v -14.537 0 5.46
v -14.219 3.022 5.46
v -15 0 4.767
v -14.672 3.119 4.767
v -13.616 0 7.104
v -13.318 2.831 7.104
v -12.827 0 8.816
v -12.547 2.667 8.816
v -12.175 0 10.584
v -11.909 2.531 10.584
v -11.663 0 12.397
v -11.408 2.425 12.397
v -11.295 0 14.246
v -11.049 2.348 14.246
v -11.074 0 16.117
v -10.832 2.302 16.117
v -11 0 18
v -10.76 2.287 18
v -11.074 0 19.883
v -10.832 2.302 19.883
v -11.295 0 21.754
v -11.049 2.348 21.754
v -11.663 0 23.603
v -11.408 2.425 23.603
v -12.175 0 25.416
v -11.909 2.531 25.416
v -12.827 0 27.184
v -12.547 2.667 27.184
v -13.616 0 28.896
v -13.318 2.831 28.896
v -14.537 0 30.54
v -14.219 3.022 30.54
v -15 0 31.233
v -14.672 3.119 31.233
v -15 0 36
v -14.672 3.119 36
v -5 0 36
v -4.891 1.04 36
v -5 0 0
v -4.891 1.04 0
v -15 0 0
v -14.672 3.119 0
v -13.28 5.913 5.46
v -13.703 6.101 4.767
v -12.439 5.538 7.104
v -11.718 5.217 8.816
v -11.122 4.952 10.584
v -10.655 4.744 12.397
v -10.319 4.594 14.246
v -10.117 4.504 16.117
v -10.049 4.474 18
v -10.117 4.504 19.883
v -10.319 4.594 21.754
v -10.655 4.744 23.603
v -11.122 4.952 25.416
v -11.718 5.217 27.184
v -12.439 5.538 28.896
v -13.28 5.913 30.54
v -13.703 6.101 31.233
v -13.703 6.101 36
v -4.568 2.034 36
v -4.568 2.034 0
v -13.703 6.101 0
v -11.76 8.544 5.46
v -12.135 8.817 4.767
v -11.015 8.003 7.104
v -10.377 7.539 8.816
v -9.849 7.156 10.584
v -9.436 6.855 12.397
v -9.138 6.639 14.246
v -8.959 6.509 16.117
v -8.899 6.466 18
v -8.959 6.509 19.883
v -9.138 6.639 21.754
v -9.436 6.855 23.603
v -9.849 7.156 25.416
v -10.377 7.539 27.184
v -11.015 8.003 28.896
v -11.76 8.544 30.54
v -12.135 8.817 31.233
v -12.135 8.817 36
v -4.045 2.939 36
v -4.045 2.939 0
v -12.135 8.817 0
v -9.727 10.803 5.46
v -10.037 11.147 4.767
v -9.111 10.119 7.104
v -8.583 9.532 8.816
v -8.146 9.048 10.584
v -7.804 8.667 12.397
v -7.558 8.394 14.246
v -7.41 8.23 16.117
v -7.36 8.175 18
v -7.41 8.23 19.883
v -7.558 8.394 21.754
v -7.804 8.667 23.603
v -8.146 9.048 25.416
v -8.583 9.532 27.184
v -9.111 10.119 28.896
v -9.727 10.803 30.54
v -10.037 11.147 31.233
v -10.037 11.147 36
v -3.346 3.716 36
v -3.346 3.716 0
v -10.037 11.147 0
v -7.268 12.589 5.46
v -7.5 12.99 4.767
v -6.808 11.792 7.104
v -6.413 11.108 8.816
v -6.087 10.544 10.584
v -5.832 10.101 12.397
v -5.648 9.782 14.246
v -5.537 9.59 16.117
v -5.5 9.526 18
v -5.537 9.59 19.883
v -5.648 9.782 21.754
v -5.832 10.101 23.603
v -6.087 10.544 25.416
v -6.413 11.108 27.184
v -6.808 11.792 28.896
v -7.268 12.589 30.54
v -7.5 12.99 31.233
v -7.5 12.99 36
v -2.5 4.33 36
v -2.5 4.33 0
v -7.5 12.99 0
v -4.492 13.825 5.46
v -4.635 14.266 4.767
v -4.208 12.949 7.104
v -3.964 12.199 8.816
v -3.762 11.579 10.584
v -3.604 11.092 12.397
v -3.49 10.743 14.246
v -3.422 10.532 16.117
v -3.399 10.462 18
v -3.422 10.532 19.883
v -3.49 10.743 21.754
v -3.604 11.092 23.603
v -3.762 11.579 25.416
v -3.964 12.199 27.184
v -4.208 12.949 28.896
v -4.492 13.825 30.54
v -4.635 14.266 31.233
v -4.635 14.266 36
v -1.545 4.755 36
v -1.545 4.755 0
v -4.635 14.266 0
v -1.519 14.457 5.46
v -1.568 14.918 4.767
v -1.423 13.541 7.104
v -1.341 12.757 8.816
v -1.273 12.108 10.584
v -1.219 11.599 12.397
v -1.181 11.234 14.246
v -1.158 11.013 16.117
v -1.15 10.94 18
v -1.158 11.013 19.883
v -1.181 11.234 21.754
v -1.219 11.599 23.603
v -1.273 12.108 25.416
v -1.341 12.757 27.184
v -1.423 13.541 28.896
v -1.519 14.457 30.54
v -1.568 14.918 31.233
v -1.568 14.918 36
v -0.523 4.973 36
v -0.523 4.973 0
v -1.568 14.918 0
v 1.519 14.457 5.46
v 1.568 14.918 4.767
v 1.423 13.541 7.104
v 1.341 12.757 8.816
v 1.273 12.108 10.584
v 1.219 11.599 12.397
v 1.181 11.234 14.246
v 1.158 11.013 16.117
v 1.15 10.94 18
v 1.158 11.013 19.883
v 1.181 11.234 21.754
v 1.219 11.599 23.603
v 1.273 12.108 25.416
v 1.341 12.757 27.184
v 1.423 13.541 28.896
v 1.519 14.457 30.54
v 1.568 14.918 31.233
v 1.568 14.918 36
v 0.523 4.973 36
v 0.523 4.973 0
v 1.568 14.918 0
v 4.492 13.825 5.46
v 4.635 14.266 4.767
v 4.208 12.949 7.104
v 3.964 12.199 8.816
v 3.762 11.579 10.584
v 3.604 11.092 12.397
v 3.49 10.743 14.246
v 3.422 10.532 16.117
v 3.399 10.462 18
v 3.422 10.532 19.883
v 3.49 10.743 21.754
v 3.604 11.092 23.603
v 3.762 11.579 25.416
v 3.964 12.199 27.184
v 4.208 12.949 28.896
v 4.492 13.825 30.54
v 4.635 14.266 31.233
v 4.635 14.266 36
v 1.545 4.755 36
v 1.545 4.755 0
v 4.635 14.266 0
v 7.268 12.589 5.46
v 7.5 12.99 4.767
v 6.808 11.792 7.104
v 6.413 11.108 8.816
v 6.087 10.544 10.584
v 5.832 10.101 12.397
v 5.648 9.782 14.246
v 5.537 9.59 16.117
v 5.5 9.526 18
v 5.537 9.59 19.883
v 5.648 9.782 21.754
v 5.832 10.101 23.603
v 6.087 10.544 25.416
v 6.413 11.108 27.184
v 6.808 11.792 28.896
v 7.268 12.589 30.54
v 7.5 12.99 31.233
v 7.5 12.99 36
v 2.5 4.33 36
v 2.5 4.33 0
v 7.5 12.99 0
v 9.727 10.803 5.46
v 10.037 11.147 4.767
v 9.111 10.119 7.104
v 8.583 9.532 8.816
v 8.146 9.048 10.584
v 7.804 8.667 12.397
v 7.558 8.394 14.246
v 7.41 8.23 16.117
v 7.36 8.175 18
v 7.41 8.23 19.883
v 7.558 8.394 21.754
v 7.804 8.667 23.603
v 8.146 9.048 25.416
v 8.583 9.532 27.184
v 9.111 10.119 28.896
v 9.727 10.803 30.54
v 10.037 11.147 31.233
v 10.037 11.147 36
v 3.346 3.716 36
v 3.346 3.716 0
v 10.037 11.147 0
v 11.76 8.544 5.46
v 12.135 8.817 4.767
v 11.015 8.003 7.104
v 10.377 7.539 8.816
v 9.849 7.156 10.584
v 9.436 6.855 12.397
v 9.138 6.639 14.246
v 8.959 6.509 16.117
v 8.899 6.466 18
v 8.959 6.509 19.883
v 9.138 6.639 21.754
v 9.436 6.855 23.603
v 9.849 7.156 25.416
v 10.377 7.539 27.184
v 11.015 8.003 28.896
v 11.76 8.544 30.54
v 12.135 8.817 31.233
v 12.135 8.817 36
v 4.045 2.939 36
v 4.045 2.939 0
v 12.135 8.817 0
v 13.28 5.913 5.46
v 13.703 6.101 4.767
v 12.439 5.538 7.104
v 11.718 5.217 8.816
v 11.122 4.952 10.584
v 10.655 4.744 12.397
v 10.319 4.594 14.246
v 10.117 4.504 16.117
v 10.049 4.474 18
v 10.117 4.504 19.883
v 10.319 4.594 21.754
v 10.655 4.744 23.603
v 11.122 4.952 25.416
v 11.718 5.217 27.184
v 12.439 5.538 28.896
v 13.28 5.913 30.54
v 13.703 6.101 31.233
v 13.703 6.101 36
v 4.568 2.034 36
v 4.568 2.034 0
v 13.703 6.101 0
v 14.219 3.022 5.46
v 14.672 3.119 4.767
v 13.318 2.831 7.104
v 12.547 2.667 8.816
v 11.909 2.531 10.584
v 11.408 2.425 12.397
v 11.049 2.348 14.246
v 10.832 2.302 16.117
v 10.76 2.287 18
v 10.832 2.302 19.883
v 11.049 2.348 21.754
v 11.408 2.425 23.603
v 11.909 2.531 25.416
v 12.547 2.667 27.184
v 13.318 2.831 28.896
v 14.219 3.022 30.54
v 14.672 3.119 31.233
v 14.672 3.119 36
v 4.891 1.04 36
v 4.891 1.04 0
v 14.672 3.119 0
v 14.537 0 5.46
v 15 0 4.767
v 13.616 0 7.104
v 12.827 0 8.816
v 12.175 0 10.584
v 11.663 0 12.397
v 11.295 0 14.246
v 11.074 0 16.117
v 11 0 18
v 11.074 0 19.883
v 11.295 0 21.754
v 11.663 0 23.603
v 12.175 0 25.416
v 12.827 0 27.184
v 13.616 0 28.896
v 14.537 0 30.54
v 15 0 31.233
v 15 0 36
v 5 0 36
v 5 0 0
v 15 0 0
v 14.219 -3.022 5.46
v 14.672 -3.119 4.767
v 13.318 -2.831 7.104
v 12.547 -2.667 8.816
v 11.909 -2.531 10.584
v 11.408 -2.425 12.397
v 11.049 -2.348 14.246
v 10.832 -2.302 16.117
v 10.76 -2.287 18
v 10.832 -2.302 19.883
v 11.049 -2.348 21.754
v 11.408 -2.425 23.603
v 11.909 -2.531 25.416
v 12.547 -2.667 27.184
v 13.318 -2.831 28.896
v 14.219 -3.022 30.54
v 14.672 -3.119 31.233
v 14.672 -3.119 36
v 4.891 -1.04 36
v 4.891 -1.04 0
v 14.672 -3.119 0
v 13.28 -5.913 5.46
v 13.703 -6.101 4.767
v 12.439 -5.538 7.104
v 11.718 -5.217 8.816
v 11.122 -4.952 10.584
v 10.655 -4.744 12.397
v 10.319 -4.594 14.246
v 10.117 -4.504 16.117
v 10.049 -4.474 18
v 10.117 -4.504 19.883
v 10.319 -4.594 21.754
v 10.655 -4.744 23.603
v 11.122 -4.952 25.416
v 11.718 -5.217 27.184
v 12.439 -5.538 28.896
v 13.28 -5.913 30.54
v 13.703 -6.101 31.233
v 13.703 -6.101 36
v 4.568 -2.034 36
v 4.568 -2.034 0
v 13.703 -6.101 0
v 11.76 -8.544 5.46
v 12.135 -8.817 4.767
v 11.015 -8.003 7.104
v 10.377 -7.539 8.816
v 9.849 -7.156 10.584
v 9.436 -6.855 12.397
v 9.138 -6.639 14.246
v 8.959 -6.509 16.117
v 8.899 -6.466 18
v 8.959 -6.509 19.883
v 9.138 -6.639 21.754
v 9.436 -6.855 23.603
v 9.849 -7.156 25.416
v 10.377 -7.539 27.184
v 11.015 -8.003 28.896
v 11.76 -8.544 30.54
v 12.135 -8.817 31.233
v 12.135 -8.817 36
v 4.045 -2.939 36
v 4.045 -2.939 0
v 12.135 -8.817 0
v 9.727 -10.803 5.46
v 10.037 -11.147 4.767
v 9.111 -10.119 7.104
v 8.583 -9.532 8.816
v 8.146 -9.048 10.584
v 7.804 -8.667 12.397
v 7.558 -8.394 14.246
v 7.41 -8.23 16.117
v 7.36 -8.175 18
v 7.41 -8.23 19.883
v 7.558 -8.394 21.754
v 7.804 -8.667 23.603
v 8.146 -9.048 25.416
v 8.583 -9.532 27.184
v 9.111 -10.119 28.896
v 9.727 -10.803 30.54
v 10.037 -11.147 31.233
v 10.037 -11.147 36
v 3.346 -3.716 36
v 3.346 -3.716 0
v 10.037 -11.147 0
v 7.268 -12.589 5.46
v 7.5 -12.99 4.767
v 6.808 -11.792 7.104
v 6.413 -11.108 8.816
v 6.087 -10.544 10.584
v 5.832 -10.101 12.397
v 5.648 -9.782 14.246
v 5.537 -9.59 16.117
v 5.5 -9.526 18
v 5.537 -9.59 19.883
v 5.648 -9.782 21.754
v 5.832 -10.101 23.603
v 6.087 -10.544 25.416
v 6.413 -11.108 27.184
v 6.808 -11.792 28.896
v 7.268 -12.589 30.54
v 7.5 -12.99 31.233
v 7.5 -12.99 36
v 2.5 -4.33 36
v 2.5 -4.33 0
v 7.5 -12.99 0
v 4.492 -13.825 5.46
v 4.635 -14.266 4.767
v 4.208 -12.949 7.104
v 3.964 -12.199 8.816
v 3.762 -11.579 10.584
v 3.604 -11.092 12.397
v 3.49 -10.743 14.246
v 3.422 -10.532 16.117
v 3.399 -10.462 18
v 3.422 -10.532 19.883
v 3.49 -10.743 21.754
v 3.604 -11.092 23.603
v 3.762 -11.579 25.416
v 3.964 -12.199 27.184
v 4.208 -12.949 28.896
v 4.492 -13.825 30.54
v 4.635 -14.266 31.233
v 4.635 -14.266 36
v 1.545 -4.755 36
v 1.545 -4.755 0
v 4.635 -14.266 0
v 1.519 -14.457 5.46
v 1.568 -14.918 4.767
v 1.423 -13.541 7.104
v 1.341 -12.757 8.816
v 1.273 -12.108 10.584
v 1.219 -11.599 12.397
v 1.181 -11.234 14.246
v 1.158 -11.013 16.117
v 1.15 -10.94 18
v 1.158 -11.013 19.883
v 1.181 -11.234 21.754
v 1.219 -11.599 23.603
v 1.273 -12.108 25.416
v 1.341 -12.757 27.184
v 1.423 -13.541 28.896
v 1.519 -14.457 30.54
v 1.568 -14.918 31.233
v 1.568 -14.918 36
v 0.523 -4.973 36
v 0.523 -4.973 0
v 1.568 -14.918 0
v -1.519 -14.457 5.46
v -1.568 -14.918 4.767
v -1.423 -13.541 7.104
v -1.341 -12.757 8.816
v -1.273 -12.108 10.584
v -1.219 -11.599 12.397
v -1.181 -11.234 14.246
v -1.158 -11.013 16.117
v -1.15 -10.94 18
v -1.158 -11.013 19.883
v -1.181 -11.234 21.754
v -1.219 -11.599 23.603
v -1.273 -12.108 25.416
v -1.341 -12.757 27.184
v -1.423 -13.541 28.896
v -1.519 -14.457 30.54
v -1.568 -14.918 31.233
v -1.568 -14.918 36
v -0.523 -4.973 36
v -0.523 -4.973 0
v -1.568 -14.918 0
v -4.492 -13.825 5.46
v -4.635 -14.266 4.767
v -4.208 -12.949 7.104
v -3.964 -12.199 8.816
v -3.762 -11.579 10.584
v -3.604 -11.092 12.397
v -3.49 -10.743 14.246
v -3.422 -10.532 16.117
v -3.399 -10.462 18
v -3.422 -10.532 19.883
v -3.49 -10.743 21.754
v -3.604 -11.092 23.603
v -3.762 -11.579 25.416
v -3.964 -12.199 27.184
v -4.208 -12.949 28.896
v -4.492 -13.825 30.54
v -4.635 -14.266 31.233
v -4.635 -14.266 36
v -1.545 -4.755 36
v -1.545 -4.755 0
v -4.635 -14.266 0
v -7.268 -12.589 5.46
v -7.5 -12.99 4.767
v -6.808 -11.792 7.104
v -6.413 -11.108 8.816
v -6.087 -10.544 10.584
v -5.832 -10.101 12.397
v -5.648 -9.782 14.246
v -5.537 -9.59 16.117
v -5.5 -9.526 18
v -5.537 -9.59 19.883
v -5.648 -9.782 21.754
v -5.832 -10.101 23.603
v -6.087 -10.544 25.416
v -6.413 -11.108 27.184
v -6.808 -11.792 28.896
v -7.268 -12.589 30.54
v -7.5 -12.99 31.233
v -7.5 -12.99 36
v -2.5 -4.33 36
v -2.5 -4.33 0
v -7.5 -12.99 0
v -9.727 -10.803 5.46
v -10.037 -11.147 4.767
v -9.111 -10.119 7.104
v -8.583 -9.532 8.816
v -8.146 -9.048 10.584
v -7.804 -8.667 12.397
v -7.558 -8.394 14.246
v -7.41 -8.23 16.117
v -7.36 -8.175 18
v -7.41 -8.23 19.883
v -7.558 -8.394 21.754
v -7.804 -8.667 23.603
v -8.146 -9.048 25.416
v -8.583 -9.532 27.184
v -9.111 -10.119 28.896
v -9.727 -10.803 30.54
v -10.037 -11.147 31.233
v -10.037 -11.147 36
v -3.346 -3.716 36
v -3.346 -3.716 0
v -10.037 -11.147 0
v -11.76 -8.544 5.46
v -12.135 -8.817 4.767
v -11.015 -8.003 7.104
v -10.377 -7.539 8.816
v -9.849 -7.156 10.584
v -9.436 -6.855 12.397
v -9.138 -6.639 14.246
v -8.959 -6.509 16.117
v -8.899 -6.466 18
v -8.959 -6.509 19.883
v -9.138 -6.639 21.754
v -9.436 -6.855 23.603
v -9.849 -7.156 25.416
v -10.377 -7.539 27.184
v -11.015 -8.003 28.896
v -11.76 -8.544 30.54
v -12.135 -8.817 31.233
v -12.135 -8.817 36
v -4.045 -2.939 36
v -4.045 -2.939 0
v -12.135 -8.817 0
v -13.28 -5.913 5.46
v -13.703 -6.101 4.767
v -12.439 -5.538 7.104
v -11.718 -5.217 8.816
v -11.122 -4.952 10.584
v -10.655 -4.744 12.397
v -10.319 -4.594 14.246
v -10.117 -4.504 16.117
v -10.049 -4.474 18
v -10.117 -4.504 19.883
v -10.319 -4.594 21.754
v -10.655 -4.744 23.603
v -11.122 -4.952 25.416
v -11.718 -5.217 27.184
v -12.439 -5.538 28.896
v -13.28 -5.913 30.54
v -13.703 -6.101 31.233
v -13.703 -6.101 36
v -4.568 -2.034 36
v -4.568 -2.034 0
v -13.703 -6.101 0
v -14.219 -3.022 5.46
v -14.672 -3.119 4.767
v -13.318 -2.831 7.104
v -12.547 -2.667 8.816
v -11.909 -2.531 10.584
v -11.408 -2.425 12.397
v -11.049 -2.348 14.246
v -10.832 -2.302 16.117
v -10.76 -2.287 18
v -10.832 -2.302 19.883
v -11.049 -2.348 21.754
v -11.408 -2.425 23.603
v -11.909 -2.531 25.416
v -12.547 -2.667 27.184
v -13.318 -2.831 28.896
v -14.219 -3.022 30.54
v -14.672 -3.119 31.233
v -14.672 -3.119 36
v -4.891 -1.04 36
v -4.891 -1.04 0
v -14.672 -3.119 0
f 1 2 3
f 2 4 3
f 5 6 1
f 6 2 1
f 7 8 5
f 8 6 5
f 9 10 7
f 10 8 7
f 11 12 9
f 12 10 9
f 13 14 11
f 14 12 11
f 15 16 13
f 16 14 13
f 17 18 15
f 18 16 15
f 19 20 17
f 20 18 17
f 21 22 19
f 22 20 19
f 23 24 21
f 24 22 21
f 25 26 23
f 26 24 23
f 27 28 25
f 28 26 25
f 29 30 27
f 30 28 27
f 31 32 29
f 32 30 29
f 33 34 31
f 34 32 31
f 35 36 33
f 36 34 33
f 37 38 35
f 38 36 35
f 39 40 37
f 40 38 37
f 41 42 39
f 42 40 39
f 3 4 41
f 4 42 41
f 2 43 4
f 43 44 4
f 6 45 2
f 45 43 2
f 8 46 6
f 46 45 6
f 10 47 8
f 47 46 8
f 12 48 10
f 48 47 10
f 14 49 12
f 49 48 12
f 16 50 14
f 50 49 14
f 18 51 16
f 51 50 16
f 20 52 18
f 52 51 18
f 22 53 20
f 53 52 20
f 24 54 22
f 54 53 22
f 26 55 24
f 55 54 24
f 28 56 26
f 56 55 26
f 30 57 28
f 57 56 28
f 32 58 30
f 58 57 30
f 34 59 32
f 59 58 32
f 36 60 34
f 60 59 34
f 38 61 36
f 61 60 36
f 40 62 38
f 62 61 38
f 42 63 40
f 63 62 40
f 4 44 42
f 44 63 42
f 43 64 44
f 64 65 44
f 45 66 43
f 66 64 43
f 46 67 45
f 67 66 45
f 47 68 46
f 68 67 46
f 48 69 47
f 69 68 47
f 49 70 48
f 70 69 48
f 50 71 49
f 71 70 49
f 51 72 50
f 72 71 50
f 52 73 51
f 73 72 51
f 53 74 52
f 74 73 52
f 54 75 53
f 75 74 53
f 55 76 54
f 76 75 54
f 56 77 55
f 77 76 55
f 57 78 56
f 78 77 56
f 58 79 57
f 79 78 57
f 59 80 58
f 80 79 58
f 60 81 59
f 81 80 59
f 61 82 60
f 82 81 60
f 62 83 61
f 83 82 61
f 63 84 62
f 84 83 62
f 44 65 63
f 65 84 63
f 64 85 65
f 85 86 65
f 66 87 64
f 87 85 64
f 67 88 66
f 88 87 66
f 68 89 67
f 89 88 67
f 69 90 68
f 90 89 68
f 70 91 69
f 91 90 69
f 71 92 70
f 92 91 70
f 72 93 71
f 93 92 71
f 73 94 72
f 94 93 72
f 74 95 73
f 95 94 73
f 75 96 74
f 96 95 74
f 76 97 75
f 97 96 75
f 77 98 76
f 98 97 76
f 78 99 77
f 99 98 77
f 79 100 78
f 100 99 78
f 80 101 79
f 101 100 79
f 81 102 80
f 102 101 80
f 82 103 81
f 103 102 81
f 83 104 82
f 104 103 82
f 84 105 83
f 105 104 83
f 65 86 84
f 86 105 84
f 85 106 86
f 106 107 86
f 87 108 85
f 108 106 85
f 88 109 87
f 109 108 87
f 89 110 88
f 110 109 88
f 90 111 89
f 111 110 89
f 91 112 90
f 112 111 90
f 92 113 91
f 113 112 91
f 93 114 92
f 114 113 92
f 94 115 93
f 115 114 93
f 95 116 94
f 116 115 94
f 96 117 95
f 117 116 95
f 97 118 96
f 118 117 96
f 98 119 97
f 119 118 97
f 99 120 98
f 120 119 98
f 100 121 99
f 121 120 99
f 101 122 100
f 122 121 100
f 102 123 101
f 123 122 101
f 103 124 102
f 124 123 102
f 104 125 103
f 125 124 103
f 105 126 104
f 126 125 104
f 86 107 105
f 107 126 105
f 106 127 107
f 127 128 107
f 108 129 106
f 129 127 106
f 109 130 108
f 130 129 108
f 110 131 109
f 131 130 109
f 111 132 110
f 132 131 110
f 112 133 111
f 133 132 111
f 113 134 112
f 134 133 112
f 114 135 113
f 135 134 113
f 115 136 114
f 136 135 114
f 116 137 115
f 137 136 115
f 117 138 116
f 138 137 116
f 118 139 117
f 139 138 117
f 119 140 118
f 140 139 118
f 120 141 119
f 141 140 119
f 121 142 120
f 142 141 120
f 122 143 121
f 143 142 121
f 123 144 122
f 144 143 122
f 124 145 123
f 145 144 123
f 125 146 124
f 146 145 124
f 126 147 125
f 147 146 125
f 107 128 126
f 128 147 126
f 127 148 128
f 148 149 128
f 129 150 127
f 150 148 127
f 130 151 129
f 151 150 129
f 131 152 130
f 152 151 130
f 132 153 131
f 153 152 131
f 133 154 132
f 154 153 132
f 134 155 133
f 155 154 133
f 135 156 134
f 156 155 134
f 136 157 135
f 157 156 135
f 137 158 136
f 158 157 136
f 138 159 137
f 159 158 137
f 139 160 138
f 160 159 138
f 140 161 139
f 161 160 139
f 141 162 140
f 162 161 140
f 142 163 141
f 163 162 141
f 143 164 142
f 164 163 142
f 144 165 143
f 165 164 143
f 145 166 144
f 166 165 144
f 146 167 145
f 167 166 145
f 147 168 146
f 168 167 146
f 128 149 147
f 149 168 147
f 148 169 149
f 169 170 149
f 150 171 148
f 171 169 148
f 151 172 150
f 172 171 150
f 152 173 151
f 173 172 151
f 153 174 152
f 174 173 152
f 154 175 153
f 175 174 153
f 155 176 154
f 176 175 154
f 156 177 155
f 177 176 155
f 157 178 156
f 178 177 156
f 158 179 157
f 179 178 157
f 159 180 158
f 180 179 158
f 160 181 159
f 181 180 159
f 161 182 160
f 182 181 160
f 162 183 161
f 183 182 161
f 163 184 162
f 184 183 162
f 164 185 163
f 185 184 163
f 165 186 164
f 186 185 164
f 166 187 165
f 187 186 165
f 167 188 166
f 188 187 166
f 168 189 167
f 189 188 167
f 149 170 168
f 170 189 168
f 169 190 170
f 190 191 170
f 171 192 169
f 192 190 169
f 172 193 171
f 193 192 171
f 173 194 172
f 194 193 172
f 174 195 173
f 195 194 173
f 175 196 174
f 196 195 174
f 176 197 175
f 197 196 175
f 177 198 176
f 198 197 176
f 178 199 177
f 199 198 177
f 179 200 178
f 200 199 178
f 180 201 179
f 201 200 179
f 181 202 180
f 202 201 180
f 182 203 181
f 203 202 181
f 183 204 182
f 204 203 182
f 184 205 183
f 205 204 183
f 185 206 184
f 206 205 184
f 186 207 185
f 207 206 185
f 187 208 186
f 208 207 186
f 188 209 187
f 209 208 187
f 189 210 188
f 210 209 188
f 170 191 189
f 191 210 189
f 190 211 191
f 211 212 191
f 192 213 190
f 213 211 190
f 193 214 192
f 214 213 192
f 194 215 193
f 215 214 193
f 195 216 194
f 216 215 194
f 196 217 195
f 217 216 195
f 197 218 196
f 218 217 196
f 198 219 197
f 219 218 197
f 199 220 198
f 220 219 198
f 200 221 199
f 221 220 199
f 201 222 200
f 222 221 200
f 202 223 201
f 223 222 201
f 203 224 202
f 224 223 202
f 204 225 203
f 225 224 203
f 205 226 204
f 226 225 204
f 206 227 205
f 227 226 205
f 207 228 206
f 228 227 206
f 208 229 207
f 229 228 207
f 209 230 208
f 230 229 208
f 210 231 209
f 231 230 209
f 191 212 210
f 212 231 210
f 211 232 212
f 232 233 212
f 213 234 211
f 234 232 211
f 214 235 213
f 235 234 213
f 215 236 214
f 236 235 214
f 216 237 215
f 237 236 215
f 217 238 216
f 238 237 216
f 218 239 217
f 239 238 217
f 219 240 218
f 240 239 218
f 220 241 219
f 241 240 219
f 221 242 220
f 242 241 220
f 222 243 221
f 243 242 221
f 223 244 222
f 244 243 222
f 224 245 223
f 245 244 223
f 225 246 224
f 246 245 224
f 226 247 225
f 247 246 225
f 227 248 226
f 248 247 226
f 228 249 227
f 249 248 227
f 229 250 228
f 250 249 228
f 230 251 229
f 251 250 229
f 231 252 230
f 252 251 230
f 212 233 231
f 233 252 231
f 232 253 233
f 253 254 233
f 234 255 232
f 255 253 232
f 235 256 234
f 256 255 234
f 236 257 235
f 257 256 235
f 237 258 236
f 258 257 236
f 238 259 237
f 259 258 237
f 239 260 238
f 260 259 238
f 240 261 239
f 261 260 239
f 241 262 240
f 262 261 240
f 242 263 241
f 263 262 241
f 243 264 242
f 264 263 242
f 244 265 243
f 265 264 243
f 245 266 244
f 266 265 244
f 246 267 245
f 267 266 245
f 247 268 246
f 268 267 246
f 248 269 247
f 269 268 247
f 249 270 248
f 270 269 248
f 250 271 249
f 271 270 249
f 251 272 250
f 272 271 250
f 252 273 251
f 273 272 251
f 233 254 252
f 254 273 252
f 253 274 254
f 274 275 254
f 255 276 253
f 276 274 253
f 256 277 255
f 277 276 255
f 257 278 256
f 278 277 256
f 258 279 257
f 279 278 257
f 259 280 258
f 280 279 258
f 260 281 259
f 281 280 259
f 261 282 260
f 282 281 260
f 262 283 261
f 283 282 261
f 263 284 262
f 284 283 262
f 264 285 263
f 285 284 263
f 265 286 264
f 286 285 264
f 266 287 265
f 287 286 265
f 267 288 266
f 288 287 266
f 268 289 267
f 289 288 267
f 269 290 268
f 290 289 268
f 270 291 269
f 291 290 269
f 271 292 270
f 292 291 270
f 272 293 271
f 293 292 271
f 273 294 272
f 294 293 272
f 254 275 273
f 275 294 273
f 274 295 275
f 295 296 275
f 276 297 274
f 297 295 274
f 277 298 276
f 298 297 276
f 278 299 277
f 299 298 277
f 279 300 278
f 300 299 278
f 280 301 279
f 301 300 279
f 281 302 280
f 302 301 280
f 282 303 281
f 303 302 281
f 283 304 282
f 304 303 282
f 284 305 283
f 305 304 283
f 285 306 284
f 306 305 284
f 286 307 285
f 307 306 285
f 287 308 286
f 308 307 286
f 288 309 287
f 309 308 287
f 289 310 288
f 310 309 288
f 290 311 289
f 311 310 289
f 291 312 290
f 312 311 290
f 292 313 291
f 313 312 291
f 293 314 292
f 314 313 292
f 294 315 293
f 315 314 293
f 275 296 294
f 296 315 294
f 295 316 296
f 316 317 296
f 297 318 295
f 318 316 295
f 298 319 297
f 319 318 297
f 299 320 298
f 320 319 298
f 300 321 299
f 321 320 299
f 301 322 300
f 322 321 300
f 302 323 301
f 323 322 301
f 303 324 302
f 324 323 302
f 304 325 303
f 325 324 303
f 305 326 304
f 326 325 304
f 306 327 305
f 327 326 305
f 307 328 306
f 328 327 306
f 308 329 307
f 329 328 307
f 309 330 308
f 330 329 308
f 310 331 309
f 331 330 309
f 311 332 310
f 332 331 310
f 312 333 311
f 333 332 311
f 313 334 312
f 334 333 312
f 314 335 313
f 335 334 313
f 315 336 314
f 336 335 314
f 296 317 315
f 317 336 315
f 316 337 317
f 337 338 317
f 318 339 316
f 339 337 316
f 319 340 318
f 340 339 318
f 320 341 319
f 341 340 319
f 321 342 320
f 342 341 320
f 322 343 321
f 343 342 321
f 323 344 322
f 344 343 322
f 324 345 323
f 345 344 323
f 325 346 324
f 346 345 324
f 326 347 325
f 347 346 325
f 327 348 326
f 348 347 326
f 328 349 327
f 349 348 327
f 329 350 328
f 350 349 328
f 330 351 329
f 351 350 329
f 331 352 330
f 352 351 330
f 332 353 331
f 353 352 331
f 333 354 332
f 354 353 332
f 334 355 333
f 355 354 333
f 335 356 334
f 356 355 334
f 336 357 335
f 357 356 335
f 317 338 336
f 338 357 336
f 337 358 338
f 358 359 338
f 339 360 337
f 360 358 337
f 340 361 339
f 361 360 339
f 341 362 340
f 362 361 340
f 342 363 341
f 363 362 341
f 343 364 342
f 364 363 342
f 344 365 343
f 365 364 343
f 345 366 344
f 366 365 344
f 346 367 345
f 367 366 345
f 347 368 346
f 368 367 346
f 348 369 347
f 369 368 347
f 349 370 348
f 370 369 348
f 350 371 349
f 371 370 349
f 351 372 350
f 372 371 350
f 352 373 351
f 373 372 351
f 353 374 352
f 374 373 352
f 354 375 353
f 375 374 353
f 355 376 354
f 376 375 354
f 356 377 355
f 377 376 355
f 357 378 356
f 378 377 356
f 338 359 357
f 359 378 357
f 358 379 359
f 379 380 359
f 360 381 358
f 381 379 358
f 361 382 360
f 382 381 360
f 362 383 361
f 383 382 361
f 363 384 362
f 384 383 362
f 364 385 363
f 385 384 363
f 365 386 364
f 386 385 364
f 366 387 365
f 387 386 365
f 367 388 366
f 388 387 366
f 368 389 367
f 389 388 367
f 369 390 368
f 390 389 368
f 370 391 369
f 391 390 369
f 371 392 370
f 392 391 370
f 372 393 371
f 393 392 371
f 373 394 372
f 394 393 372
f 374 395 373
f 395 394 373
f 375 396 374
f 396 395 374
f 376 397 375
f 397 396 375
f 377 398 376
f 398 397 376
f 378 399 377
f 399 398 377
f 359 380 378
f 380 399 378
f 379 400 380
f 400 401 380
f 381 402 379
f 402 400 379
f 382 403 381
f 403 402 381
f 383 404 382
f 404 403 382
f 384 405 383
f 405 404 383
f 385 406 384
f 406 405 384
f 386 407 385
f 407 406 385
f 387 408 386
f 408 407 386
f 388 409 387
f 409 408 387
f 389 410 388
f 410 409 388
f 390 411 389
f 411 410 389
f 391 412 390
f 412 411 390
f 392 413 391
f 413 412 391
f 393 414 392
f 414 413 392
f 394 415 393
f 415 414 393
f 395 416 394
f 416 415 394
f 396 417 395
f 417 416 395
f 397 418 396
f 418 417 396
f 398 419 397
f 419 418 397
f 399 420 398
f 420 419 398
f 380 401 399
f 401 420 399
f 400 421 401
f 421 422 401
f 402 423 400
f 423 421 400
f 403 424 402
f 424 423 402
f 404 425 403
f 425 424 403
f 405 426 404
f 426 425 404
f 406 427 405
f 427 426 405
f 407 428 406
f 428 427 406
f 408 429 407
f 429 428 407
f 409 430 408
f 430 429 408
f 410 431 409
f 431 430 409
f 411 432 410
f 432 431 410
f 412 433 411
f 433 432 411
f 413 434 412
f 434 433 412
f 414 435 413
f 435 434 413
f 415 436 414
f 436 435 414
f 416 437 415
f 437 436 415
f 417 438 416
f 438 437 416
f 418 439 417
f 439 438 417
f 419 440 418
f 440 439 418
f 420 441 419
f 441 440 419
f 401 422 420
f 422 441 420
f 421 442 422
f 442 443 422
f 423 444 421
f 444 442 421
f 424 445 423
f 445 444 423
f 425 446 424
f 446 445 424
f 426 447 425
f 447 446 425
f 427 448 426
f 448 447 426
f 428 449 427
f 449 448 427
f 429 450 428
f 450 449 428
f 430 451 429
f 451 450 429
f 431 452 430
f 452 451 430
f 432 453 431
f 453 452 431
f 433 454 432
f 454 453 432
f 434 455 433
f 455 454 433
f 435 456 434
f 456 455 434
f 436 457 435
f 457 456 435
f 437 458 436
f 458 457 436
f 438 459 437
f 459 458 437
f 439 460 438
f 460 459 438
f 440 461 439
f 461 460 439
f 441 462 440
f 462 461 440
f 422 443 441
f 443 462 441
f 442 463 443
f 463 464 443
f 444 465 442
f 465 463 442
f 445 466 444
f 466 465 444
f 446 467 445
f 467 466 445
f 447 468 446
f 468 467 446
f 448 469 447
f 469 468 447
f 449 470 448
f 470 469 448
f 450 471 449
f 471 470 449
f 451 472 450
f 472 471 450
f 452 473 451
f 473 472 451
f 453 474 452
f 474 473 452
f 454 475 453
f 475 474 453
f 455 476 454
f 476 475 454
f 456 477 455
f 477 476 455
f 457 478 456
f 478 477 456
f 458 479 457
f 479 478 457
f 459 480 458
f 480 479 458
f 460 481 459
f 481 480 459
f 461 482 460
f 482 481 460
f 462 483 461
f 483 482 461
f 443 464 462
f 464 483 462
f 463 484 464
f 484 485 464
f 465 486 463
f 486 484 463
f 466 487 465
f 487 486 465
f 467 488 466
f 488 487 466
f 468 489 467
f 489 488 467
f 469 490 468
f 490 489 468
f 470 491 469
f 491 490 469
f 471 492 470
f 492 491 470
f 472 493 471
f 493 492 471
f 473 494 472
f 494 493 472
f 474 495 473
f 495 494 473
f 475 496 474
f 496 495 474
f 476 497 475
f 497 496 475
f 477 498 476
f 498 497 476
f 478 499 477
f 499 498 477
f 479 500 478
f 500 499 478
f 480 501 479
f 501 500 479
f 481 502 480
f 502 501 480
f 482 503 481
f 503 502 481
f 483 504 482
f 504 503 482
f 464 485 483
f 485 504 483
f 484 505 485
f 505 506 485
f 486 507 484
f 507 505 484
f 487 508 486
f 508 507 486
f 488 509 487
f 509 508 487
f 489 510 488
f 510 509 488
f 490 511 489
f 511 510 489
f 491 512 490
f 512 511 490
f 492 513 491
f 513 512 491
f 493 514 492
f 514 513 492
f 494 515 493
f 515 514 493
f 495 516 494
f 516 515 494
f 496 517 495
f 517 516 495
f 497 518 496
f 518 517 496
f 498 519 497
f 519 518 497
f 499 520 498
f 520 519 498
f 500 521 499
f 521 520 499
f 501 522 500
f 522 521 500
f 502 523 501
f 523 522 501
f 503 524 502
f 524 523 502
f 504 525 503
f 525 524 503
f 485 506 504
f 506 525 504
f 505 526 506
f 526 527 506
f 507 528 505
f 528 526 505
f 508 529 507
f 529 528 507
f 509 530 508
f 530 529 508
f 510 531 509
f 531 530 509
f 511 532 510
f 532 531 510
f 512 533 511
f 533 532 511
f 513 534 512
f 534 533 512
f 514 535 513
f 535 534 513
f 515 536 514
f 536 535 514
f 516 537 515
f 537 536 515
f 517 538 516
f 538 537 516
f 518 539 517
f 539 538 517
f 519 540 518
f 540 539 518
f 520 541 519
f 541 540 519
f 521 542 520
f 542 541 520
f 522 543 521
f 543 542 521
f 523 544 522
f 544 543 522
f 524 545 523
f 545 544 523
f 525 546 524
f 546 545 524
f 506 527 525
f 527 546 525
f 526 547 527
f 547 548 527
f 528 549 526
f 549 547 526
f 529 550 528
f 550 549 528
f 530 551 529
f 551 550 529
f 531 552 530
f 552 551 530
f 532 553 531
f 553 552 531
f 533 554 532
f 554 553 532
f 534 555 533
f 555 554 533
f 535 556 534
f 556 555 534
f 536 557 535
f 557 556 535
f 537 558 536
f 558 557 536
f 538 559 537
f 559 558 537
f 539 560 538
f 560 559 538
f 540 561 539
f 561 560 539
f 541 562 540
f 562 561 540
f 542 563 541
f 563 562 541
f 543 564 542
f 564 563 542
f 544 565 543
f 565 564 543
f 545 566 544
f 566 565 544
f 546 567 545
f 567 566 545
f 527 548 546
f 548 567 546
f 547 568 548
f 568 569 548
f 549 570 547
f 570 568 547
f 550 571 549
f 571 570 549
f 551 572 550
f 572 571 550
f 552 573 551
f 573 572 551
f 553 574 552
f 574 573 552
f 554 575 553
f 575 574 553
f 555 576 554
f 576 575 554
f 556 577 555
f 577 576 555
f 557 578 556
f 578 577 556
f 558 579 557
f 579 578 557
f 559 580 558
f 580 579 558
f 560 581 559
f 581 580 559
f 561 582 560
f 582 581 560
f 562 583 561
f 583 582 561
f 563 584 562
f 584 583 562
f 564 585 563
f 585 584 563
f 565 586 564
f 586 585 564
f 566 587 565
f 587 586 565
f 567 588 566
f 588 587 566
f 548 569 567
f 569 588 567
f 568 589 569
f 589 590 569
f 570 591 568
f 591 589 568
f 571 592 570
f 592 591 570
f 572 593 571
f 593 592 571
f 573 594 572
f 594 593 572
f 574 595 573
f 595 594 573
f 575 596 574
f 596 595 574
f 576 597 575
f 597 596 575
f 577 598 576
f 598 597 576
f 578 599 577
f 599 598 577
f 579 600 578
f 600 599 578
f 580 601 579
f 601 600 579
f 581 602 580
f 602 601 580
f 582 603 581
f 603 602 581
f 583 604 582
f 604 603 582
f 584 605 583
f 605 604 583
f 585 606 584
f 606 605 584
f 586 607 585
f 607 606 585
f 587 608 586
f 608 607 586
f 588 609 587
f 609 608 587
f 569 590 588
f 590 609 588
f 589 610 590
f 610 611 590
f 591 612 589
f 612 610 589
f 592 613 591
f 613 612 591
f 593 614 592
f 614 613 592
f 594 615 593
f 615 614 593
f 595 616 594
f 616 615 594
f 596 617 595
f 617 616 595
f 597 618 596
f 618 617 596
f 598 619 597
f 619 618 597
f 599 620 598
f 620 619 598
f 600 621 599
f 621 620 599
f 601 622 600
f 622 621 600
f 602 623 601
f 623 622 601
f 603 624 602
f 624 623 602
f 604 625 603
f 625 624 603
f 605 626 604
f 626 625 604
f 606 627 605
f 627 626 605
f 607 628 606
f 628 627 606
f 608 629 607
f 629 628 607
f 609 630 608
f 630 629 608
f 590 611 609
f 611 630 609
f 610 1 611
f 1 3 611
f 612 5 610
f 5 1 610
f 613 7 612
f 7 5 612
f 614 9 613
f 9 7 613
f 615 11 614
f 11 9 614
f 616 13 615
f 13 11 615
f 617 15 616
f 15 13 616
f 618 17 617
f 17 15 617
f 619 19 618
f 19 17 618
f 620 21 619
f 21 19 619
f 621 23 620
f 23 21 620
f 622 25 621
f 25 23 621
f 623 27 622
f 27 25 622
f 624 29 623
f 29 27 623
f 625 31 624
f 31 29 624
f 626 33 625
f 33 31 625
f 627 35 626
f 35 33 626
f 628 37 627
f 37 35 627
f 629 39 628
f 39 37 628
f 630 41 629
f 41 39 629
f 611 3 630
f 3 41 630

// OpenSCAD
// Simple standoff for the memory decoder

module decoder_standoff() {
  difference() {
    cylinder(d=20, h=36);
    translate([0,0,-1]) cylinder(d=10,h=38);
  }
}

module decoder_profile_2d() {
  difference() {
    translate([5,0]) square([10,36]);
    translate([35,18]) circle(d=48, $fn=80);
  }
}

rotate_extrude() { decoder_profile_2d(); }
